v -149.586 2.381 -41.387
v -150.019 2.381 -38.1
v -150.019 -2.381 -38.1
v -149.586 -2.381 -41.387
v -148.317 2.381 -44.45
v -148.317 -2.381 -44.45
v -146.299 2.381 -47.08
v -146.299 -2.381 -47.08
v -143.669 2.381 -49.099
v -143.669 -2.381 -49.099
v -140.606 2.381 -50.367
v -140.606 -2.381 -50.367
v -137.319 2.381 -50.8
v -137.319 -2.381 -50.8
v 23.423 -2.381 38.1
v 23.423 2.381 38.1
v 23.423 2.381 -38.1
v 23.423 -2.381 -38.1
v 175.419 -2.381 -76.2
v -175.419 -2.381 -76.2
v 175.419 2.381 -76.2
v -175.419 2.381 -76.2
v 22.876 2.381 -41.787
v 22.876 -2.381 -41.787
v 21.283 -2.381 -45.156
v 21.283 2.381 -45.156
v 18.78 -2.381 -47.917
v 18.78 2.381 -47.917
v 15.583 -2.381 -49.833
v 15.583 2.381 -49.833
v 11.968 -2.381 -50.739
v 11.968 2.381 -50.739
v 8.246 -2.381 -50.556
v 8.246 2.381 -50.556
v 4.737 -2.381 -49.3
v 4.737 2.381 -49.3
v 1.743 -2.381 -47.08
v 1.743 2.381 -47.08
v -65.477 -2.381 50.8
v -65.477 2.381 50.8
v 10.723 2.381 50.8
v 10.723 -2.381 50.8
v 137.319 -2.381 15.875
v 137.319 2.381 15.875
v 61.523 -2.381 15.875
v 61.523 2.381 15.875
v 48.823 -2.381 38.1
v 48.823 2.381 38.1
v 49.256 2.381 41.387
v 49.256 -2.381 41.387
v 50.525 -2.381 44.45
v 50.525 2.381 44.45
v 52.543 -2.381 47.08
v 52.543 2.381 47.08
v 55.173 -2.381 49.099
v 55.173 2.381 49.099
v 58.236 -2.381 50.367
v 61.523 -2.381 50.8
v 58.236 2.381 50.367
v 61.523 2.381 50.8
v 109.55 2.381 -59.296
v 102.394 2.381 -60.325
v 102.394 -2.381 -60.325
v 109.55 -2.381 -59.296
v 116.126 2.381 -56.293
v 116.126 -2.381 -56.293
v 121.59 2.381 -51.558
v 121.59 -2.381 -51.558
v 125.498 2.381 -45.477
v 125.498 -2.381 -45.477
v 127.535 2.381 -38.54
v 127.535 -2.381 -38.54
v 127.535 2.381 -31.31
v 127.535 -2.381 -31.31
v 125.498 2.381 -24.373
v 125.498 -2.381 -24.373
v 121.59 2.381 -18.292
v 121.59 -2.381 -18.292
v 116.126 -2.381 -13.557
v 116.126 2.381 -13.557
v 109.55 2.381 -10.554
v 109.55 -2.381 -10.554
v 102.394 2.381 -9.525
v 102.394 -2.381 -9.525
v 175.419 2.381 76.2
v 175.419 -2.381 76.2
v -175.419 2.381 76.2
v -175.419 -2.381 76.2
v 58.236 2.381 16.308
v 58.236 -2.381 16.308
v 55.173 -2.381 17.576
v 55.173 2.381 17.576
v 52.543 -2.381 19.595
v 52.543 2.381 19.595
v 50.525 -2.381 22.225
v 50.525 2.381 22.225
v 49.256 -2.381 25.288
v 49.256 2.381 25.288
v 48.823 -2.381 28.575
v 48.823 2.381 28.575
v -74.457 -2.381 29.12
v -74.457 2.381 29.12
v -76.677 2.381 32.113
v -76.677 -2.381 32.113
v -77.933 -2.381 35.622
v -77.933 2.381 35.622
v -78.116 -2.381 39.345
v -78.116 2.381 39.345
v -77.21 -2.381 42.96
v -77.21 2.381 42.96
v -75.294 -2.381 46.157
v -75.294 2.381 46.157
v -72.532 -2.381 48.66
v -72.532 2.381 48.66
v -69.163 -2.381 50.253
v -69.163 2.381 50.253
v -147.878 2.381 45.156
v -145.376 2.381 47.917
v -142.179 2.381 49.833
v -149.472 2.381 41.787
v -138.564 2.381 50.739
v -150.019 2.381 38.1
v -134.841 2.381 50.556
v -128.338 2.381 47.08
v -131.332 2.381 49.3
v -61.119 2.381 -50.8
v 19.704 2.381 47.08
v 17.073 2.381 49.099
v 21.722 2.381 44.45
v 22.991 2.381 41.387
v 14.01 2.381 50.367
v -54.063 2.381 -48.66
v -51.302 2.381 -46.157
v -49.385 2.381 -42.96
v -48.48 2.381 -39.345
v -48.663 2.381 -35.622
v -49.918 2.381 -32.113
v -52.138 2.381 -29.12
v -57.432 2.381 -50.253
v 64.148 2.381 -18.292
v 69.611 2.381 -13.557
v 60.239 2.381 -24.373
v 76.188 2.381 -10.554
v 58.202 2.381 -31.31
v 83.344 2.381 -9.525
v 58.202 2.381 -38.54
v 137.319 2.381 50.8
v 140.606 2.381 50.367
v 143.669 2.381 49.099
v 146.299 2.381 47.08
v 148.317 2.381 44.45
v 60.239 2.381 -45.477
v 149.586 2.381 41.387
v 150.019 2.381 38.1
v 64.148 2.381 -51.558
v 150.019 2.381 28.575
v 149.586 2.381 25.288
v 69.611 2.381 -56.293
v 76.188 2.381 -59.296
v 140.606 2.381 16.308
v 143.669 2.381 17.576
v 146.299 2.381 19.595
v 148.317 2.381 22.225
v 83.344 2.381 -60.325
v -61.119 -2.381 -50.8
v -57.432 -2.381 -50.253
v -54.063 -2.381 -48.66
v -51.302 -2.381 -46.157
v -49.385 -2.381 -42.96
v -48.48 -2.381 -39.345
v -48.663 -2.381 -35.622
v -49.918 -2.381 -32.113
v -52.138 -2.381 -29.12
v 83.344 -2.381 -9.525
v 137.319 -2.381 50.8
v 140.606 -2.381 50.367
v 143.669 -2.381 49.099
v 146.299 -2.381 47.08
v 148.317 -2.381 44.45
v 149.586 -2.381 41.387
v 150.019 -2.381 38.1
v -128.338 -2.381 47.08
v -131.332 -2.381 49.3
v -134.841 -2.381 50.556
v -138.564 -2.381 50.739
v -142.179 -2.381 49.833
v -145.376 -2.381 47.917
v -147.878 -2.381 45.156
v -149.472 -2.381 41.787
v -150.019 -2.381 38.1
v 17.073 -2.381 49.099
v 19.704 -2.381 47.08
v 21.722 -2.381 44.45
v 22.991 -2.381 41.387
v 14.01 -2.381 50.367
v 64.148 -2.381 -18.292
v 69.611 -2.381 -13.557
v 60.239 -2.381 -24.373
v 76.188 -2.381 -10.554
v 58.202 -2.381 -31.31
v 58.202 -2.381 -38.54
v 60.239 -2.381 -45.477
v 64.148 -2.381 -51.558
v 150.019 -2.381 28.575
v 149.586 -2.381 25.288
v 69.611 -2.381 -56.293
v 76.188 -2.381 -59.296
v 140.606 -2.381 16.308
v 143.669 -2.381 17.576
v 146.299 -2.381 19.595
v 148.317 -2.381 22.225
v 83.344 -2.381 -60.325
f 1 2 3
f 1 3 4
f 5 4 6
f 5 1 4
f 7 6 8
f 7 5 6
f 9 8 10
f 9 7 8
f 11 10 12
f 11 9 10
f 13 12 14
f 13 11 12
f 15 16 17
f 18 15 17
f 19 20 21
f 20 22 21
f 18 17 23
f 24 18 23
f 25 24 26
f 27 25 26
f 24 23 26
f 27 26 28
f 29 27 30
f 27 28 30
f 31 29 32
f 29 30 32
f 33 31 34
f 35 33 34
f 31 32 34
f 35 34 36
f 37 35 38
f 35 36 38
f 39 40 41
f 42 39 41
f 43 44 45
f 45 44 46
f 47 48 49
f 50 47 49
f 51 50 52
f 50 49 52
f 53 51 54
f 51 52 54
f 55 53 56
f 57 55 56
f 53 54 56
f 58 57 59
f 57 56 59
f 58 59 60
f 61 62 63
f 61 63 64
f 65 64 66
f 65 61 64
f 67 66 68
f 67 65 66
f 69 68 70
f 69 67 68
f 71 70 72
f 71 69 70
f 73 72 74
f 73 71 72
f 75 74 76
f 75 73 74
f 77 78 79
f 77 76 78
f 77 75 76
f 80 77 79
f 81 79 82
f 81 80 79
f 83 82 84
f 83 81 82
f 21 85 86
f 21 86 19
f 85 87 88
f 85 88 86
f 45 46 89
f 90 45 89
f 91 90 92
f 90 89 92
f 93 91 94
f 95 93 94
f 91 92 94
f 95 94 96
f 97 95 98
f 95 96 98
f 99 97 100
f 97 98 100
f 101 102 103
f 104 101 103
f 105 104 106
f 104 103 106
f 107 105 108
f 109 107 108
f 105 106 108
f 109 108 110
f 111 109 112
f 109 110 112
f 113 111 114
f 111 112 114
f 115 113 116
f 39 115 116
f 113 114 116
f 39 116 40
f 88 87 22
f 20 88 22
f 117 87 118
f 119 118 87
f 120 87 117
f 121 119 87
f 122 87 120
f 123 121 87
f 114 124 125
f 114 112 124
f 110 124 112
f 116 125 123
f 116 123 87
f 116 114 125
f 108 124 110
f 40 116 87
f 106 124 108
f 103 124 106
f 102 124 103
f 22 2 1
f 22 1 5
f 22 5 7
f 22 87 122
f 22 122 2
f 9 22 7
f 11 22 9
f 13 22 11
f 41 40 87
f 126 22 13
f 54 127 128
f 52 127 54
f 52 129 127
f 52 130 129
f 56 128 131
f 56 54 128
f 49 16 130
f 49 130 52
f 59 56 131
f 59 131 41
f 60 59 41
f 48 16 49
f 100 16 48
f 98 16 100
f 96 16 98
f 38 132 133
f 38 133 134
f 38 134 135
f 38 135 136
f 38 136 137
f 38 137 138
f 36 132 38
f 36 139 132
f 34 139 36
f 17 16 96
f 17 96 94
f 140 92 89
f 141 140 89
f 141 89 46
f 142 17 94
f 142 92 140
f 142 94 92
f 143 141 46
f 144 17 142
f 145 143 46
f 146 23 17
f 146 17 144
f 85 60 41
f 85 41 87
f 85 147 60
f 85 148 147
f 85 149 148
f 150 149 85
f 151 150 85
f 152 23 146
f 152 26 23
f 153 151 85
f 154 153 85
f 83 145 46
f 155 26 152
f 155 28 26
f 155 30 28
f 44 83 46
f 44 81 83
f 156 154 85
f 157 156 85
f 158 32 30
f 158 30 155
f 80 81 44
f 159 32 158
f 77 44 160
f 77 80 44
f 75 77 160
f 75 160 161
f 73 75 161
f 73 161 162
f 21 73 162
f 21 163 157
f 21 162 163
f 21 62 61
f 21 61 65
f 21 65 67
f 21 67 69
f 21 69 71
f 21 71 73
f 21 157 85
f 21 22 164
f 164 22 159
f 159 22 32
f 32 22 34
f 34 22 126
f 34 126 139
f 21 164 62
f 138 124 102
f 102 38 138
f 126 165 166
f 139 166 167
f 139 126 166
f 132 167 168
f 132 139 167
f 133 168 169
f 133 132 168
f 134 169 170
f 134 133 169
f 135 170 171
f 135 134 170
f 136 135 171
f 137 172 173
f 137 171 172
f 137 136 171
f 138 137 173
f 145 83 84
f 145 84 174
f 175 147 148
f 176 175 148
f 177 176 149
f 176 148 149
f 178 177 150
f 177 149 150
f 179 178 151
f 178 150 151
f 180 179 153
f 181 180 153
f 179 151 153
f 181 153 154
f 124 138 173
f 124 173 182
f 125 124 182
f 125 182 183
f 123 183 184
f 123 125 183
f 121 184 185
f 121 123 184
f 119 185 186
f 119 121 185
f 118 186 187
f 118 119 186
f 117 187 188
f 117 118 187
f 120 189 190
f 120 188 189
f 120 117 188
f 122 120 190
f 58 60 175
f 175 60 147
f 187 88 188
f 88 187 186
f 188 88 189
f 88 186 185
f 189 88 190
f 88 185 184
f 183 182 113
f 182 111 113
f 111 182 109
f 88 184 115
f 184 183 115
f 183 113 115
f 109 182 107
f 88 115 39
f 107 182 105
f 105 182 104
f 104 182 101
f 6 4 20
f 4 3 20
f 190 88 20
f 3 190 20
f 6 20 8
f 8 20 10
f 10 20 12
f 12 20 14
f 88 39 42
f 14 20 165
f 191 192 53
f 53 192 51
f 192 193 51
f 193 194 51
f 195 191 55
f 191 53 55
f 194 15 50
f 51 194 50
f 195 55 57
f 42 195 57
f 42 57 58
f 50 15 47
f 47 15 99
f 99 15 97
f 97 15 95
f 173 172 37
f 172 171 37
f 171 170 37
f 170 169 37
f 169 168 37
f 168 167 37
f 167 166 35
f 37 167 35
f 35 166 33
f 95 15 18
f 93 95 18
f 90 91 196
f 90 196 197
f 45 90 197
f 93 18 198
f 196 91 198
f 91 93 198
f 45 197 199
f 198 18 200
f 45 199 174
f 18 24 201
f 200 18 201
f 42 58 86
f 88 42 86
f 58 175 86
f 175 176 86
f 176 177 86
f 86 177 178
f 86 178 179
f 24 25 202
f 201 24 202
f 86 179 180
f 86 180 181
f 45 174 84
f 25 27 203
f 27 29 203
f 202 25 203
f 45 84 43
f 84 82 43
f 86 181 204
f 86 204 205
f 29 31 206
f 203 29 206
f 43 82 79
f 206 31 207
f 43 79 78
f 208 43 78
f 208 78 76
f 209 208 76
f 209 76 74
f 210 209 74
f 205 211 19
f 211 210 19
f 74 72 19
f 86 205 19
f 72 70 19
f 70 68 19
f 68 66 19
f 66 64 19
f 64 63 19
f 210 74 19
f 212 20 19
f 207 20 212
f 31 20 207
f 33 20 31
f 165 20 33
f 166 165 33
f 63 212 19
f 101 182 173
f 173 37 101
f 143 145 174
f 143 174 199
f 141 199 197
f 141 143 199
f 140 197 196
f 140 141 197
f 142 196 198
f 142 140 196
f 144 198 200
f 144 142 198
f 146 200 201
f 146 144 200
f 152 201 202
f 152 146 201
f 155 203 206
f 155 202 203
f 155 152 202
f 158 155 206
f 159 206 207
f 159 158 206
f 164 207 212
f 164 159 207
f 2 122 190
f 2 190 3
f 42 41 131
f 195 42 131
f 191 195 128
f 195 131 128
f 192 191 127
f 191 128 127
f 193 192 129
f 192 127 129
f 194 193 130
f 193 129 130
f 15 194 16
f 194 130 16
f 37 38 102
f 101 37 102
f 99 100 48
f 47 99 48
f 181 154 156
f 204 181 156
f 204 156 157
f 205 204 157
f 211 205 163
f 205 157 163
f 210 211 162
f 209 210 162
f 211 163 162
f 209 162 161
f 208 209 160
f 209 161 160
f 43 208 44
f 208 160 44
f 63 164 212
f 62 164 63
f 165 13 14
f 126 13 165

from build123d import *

# Parameters (mm, degrees)
SKETCH1_W           = 350.8375
SKETCH1_H           = 152.4
BOSS_EXTRUDE1_DEPTH = 2.38125
CUT_EXTRUDE1_DEPTH  = 5.7625


with BuildPart() as part:
    # Sketch1 → Boss-Extrude1 (new body, symmetric)
    with BuildSketch(Plane(origin=(0, 0, 0), x_dir=(1, 0, 0), z_dir=(0, 1, 0))):
        Rectangle(SKETCH1_W, SKETCH1_H)
    extrude(amount=BOSS_EXTRUDE1_DEPTH, both=True)

    # Sketch2 → Cut-Extrude1 (cut, through all)
    with BuildSketch(Plane(origin=(0, 2.38125, 0), x_dir=(1, 0, 0), z_dir=(0, 1, 0))):
        with BuildLine():
            Line((102.39375, 9.525), (83.34375, 9.525))
            ThreePointArc((83.34375, 9.525), (57.94375, 34.925), (83.34375, 60.325))
            Line((83.34375, 60.325), (102.39375, 60.325))
            ThreePointArc((102.39375, 60.325), (127.79375, 34.925), (102.39375, 9.525))
        make_face()
        with BuildLine():
            Line((-137.31875, 50.8), (-61.11875, 50.8))
            ThreePointArc((-61.11875, 50.8), (-49.385479937, 42.960079591), (-52.138493879, 29.119743879))
            Line((-52.138493879, 29.119743879), (-128.338493879, -47.080256121))
            ThreePointArc((-128.338493879, -47.080256121), (-142.178829591, -49.833270063), (-150.01875, -38.1))
            Line((-150.01875, -38.1), (-150.01875, 38.1))
            ThreePointArc((-150.01875, 38.1), (-146.299006121, 47.080256121), (-137.31875, 50.8))
        make_face()
        with BuildLine():
            Line((-65.476701031, -50.8), (10.723298969, -50.8))
            ThreePointArc((10.723298969, -50.8), (19.70355509, -47.080256121), (23.423298969, -38.1))
            Line((23.423298969, -38.1), (23.423298969, 38.1))
            ThreePointArc((23.423298969, 38.1), (15.58337856, 49.833270063), (1.743042847, 47.080256121))
            Line((1.743042847, 47.080256121), (-74.456957153, -29.119743879))
            ThreePointArc((-74.456957153, -29.119743879), (-77.209971094, -42.960079591), (-65.476701031, -50.8))
        make_face()
        with BuildLine():
            Line((61.523298969, -50.8), (137.31875, -50.8))
            ThreePointArc((137.31875, -50.8), (146.299006121, -47.080256121), (150.01875, -38.1))
            Line((150.01875, -38.1), (150.01875, -28.575))
            ThreePointArc((150.01875, -28.575), (146.299006121, -19.594743879), (137.31875, -15.875))
            Line((137.31875, -15.875), (61.523298969, -15.875))
            ThreePointArc((61.523298969, -15.875), (52.543042847, -19.594743879), (48.823298969, -28.575))
            Line((48.823298969, -28.575), (48.823298969, -38.1))
            ThreePointArc((48.823298969, -38.1), (52.543042847, -47.080256121), (61.523298969, -50.8))
        make_face()
    extrude(amount=-CUT_EXTRUDE1_DEPTH, mode=Mode.SUBTRACT)


solid = part.part
